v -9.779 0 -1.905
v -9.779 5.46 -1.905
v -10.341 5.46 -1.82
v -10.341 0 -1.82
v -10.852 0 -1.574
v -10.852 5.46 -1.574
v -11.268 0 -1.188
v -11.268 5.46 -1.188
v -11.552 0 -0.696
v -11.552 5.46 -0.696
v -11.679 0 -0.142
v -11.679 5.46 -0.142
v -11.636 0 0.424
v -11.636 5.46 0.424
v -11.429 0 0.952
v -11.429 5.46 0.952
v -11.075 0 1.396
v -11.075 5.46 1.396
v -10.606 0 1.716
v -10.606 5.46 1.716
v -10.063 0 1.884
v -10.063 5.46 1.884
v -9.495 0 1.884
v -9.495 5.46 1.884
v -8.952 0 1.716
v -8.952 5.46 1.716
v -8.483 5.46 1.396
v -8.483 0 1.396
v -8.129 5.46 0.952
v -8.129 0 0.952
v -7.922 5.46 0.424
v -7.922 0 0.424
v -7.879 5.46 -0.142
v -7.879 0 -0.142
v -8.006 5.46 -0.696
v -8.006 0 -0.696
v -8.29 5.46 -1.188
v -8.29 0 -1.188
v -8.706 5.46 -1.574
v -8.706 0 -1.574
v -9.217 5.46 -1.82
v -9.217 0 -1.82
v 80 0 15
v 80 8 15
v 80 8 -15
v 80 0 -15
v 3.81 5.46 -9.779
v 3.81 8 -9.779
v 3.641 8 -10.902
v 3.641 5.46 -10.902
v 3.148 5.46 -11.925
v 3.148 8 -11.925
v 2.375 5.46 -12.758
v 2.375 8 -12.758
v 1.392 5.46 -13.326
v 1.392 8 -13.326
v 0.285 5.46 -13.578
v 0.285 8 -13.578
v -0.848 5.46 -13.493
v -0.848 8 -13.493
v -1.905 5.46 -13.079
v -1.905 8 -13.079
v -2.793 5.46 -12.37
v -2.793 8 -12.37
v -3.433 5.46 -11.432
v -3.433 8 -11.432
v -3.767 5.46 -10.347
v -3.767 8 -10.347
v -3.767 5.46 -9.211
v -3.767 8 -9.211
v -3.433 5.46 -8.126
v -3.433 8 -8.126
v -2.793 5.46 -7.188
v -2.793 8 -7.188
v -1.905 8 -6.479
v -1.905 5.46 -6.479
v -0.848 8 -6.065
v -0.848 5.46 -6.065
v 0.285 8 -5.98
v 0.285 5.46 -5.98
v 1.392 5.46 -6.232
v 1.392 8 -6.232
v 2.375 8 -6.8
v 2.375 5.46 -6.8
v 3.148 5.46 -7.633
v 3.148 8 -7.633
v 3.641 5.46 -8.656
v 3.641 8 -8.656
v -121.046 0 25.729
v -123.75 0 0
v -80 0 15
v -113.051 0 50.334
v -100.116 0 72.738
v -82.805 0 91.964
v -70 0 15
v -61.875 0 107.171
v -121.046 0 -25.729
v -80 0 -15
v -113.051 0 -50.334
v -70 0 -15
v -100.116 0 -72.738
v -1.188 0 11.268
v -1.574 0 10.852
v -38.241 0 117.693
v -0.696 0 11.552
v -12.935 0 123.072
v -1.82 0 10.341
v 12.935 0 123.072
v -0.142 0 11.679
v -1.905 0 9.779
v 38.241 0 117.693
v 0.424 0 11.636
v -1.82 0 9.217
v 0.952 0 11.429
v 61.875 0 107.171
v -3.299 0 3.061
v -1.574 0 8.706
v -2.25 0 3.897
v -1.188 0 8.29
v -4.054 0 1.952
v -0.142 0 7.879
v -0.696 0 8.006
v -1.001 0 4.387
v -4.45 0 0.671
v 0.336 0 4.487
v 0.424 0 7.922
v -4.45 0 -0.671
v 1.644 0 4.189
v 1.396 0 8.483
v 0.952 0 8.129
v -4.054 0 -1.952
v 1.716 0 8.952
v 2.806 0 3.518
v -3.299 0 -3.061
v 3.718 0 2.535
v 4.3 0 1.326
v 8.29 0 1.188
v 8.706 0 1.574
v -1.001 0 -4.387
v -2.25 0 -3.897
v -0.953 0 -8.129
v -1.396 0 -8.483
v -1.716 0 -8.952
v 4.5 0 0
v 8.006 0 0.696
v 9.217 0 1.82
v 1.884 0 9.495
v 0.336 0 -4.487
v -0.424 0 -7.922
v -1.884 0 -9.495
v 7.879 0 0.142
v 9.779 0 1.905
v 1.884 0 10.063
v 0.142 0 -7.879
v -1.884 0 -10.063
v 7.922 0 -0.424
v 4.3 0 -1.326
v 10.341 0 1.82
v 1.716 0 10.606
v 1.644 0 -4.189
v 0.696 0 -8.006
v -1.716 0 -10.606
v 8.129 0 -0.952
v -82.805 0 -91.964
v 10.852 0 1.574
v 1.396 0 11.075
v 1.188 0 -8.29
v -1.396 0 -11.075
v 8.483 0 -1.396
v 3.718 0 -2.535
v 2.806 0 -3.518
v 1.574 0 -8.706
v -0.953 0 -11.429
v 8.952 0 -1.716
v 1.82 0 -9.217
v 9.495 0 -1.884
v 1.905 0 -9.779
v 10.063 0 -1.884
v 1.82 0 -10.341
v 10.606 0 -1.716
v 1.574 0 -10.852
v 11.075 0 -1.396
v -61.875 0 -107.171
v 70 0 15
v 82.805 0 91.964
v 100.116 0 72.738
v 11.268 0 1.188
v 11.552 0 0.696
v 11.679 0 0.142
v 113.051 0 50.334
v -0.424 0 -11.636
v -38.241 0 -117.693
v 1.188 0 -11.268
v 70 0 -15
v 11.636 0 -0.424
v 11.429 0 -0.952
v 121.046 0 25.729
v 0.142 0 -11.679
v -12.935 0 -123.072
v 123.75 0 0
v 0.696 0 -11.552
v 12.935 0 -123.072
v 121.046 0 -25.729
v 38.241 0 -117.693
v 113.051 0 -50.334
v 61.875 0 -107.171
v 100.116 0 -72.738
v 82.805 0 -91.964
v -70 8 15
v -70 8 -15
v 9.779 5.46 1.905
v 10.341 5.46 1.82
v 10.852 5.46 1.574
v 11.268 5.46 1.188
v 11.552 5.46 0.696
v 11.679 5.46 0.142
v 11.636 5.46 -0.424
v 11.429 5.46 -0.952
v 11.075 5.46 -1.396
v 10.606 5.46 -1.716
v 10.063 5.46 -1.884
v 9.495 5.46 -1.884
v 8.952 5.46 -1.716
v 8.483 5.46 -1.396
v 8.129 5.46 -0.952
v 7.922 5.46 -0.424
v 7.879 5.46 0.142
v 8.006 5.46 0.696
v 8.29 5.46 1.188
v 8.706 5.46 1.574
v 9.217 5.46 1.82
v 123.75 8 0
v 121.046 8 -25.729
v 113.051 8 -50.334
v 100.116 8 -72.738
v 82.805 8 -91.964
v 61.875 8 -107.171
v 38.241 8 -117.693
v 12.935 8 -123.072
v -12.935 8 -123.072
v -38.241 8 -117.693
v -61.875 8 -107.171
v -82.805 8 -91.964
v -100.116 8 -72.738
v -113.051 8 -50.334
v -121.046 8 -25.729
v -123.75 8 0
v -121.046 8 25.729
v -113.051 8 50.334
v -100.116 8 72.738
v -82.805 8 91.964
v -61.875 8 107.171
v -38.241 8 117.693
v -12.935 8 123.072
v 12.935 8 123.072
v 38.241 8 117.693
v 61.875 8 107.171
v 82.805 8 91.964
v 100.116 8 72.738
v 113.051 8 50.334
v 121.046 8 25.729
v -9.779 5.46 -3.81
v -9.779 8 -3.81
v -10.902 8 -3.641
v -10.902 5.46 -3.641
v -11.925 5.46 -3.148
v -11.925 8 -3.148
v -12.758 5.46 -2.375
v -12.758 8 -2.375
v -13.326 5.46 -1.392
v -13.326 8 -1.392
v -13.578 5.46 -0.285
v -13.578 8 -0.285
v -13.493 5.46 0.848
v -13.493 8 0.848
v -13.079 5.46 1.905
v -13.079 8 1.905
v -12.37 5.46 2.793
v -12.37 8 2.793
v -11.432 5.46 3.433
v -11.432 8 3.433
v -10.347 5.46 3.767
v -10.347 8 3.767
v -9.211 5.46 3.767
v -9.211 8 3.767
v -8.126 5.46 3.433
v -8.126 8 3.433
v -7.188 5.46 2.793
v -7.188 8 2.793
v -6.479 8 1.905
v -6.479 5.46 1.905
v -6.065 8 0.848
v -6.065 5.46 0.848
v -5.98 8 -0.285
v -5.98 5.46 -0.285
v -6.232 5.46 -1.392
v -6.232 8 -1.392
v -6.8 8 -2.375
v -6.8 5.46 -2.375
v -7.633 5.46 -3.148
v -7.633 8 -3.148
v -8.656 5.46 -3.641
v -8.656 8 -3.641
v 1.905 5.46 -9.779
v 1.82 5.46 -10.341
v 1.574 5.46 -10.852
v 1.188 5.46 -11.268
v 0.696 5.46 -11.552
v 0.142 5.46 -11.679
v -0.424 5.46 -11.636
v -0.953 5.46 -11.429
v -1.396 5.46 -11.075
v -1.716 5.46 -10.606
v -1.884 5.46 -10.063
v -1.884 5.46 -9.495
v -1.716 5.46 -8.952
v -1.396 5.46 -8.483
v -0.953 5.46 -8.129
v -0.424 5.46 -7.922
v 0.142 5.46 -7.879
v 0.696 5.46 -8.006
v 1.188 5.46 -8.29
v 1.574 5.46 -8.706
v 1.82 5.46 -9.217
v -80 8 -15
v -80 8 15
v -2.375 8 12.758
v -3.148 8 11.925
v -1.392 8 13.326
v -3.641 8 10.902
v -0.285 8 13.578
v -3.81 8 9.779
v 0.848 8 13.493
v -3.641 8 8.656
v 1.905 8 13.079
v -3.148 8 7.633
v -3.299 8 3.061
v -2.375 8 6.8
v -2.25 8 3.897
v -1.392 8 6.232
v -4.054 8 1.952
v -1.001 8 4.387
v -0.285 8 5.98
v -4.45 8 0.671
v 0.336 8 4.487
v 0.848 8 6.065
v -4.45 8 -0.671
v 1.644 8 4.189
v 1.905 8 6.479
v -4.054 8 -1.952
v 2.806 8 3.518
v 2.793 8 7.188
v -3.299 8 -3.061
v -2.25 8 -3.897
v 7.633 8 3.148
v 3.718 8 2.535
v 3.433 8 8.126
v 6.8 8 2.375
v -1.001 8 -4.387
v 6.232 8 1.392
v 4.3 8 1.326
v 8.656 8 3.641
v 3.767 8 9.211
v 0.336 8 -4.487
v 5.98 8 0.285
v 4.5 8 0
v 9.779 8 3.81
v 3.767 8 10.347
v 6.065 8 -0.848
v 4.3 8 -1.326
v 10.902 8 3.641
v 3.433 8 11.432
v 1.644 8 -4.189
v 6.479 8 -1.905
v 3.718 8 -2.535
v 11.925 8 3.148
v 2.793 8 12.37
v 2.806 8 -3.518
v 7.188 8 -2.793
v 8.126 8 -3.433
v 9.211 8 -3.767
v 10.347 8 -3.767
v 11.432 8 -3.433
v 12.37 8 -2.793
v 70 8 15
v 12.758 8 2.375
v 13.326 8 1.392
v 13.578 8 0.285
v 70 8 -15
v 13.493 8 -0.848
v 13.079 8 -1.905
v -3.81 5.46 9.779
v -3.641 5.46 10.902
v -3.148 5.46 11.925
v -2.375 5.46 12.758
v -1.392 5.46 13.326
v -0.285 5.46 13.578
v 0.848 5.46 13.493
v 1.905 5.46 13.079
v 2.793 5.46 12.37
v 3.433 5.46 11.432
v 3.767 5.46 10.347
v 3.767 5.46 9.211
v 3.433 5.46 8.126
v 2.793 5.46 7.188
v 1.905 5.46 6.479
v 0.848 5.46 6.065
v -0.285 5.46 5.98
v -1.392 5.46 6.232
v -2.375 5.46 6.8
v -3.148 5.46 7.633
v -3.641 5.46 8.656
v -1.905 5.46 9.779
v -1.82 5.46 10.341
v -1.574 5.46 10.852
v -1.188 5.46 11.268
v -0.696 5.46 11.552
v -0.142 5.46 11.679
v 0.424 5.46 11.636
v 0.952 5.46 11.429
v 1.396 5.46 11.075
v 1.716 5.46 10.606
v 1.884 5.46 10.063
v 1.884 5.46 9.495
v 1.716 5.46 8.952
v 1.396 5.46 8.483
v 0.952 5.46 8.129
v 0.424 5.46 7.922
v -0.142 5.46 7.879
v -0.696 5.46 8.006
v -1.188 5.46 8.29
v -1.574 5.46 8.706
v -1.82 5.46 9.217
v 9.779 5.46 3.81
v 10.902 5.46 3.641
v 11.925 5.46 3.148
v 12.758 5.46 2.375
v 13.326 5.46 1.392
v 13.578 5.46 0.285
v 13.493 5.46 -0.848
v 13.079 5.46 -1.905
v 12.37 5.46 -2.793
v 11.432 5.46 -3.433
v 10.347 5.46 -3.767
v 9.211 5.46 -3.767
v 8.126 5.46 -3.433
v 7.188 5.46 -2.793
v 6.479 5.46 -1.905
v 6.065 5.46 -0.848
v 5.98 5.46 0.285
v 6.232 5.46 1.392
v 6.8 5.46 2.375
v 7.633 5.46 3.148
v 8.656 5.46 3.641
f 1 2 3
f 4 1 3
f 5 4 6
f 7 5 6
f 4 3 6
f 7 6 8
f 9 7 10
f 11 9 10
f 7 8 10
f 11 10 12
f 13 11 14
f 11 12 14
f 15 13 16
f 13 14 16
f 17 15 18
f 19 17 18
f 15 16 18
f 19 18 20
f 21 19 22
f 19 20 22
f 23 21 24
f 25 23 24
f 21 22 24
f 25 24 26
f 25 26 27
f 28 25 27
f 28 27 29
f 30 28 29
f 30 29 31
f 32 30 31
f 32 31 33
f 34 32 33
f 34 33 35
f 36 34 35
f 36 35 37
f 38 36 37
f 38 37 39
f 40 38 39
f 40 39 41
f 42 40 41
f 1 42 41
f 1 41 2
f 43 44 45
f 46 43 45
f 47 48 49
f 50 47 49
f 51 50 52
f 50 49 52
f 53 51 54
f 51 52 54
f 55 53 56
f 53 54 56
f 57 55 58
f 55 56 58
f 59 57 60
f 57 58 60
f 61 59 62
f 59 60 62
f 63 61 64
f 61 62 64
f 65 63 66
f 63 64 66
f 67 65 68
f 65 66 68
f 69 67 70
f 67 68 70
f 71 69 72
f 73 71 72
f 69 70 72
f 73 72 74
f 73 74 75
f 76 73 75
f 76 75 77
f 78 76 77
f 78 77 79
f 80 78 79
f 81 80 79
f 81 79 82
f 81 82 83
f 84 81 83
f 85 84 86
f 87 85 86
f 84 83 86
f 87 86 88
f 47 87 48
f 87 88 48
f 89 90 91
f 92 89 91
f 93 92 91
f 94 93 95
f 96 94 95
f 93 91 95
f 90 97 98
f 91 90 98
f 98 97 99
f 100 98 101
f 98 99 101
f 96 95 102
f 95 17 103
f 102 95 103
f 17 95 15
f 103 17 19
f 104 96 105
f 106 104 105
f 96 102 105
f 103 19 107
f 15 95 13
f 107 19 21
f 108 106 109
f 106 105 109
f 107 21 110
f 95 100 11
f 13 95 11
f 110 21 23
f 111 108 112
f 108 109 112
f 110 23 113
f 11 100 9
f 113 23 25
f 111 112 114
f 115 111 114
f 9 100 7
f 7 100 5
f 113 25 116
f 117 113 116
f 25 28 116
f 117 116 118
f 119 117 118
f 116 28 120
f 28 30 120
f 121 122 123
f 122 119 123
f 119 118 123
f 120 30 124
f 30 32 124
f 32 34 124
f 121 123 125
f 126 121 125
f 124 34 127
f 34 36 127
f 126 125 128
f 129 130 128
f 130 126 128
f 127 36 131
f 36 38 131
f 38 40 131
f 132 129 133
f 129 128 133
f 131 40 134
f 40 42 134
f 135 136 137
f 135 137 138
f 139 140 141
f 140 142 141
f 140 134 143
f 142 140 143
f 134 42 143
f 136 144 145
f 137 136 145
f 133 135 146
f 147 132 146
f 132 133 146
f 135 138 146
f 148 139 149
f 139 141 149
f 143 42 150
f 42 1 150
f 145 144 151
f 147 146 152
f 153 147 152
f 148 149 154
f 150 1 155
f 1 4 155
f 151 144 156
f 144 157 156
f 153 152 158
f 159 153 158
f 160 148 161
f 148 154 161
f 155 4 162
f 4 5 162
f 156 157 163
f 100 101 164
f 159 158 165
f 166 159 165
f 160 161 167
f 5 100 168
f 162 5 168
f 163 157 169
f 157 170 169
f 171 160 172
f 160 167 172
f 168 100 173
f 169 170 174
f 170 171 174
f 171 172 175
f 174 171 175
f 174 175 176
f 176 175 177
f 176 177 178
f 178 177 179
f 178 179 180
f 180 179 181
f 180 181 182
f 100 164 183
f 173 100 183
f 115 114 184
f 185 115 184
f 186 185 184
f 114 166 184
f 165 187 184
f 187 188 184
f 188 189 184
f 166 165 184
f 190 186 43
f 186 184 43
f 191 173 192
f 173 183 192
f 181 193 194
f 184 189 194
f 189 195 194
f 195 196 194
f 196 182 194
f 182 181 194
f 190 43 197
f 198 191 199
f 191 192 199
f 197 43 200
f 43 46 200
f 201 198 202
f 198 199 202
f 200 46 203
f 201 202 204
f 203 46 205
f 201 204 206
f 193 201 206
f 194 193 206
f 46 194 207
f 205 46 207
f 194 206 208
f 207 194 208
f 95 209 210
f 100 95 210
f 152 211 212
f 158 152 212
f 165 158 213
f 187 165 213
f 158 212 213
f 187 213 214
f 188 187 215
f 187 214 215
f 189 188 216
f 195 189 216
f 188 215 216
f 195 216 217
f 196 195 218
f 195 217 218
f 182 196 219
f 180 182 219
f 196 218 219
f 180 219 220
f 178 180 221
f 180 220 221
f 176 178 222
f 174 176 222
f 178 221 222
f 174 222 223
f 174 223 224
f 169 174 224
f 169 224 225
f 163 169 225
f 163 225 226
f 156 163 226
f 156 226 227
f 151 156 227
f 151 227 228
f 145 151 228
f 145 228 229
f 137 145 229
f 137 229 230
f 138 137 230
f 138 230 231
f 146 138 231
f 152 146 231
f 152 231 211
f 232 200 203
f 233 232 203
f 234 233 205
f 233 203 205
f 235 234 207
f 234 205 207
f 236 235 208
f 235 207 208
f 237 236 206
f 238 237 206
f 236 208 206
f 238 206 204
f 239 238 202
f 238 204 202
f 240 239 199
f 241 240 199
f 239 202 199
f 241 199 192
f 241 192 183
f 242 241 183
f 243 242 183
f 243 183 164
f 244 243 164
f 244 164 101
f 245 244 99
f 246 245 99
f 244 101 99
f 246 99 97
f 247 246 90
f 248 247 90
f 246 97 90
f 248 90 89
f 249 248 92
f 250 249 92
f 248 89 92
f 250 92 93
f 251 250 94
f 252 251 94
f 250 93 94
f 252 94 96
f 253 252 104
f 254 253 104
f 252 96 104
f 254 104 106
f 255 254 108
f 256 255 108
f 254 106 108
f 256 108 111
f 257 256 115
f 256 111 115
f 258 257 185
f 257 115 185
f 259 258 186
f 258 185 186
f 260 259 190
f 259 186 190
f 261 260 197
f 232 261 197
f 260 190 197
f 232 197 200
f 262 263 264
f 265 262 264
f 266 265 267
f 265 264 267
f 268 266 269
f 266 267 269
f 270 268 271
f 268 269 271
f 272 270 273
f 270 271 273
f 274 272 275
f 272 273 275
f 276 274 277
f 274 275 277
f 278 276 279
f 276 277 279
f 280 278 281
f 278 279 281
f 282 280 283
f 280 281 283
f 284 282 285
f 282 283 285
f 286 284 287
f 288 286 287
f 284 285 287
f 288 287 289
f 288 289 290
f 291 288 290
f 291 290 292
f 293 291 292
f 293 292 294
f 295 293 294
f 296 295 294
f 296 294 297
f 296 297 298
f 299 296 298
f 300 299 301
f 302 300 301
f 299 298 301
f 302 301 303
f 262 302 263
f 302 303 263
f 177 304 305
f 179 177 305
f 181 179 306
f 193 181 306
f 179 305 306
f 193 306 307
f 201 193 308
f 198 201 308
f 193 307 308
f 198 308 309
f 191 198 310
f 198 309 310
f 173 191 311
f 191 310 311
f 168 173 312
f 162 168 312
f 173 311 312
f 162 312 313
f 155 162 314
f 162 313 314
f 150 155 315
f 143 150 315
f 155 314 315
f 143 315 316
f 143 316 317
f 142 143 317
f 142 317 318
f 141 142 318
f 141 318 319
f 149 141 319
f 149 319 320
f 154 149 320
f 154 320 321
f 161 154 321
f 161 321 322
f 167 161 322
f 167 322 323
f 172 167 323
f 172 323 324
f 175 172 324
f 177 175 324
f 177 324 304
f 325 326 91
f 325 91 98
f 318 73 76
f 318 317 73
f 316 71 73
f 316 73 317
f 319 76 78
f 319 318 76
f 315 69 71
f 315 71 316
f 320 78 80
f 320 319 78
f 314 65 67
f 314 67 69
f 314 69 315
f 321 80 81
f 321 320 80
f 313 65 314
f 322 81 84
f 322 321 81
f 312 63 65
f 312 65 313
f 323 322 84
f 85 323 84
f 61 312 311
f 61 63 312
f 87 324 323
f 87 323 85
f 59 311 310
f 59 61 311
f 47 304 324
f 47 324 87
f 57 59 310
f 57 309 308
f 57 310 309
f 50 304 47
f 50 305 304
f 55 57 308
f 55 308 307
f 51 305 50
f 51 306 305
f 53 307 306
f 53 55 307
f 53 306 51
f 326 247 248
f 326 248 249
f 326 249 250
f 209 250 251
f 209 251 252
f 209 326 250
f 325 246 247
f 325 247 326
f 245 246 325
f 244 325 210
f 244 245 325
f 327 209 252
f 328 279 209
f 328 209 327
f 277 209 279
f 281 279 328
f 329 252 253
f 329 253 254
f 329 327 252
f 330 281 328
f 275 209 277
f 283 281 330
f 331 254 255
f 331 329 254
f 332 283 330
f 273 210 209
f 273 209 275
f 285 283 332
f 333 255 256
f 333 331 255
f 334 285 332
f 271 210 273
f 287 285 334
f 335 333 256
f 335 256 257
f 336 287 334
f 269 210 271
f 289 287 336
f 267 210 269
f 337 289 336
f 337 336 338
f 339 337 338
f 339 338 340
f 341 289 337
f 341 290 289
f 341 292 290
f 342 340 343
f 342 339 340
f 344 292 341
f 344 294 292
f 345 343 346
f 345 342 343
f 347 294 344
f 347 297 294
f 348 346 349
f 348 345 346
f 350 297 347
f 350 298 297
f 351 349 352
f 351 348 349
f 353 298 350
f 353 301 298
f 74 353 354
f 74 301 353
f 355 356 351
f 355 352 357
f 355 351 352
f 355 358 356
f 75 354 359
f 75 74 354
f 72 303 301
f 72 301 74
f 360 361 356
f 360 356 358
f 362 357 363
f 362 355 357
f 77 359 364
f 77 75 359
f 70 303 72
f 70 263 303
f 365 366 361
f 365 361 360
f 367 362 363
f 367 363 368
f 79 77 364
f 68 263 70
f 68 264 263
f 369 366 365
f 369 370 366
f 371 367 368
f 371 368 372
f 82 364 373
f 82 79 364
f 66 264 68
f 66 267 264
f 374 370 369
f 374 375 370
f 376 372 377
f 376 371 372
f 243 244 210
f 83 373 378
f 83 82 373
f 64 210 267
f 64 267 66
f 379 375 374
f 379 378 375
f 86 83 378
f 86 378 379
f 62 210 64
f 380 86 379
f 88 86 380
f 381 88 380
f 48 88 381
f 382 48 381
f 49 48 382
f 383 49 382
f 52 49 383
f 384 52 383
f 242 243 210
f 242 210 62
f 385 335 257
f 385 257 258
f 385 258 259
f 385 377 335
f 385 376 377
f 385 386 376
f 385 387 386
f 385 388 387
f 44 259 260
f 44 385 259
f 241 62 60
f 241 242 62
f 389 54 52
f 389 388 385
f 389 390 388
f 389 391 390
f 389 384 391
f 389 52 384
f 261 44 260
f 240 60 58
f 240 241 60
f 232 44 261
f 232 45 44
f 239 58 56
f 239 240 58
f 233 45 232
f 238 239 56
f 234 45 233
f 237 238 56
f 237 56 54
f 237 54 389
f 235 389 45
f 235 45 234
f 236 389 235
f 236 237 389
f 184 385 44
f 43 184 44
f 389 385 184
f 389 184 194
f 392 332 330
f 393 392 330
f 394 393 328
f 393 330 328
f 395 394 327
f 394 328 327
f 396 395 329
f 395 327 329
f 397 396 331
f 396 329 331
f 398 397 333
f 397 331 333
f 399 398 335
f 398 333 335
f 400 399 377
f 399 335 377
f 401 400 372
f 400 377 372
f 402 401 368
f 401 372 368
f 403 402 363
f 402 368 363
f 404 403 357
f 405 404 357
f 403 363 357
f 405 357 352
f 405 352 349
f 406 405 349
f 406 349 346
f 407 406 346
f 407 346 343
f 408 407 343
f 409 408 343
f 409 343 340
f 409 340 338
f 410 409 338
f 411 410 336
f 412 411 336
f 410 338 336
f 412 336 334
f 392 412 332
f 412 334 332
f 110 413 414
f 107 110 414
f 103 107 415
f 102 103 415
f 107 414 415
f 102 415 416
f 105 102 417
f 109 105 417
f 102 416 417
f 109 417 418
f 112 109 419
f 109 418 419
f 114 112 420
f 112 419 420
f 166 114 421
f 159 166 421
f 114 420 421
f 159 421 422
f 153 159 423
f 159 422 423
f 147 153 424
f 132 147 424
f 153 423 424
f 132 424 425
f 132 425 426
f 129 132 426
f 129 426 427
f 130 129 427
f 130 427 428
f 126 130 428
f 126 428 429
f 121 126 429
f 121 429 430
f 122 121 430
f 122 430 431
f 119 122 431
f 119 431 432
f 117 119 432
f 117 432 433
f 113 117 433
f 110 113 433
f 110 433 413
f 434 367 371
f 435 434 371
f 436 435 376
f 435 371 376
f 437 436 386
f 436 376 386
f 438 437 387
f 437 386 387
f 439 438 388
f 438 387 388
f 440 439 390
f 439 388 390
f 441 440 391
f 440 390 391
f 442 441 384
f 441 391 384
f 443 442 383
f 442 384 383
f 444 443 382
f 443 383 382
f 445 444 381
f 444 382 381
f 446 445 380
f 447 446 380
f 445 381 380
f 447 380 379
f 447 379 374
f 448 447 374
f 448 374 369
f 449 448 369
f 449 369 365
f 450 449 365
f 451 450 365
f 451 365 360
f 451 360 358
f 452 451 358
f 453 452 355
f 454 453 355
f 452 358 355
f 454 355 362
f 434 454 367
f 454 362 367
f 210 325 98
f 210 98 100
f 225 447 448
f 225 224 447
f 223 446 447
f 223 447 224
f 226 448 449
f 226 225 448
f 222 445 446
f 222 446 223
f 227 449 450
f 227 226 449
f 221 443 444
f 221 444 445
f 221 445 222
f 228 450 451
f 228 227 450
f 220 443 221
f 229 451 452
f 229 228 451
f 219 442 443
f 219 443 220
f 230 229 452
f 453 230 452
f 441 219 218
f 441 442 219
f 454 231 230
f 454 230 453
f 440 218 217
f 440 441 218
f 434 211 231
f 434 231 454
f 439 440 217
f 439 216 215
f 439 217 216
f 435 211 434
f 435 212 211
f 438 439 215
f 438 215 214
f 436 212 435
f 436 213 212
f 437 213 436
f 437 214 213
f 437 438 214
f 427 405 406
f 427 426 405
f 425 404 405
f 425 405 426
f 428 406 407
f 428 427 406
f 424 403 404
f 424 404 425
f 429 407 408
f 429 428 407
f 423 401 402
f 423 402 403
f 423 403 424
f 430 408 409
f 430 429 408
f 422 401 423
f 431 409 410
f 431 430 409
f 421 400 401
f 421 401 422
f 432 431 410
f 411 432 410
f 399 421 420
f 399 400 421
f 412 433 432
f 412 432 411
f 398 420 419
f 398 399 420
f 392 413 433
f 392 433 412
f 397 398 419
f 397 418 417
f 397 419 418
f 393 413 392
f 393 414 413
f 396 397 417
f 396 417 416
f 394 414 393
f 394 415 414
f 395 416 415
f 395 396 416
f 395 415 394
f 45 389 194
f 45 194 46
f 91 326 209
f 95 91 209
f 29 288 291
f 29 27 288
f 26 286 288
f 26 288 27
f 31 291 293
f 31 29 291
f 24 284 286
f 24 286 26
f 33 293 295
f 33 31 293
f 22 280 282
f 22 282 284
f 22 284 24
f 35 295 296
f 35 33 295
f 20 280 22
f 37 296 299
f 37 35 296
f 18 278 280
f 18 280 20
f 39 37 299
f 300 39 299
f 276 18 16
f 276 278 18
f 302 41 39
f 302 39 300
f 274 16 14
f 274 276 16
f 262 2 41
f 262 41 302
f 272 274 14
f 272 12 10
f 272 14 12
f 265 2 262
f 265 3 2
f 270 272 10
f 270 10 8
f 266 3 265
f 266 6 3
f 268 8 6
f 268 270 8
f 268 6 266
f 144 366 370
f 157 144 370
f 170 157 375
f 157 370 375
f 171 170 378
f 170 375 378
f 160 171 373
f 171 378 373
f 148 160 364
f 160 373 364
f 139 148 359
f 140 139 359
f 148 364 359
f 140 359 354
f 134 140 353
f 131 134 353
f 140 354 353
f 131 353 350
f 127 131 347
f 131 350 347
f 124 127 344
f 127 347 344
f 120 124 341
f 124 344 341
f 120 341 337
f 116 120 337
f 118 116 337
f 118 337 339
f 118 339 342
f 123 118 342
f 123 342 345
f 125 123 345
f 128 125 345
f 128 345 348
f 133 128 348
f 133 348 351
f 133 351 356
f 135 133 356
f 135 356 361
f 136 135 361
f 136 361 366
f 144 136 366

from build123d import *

# Parameters (mm, degrees)
SKETCH1_R           = 123.75
BOSS_EXTRUDE1_DEPTH = 8
SKETCH2_R           = 1.905
CUT_EXTRUDE2_DEPTH  = 9
CIRPATTERN1_COUNT   = 4
SKETCH3_R           = 4.5
CUT_EXTRUDE3_DEPTH  = 9
SKETCH4_R           = 3.81
CUT_EXTRUDE4_DEPTH  = 2.54
CIRPATTERN2_COUNT   = 4
SKETCH5_W           = 10
SKETCH5_H           = 30
CUT_EXTRUDE5_DEPTH  = 9


with BuildPart() as part:
    # Sketch1 → Boss-Extrude1 (new body)
    with BuildSketch(Plane(origin=(0, 0, 0), x_dir=(1, 0, 0), z_dir=(0, 1, 0))):
        Circle(SKETCH1_R)
    extrude(amount=BOSS_EXTRUDE1_DEPTH)

    # Sketch2 → Cut-Extrude2 (cut, through all)
    with BuildSketch(Plane(origin=(0, 8, 0), x_dir=(1, 0, 0), z_dir=(0, 1, 0))):
        with Locations((0, 9.779)):
            Circle(SKETCH2_R)
    cut_extrude2 = extrude(amount=-CUT_EXTRUDE2_DEPTH, mode=Mode.SUBTRACT)

    # CirPattern1: Cut-Extrude2 ×4 about axis
    cirpattern1_axis = Axis((0, 0, 0), (0, 1, 0))
    for i in range(1, CIRPATTERN1_COUNT):
        add(cut_extrude2.rotate(cirpattern1_axis, i * 360 / CIRPATTERN1_COUNT), mode=Mode.SUBTRACT)

    # Sketch3 → Cut-Extrude3 (cut, through all)
    with BuildSketch(Plane(origin=(0, 8, 0), x_dir=(1, 0, 0), z_dir=(0, 1, 0))):
        Circle(SKETCH3_R)
    extrude(amount=-CUT_EXTRUDE3_DEPTH, mode=Mode.SUBTRACT)

    # Sketch4 → Cut-Extrude4 (cut)
    with BuildSketch(Plane(origin=(0, 8, 0), x_dir=(1, 0, 0), z_dir=(0, 1, 0))):
        with Locations((0, 9.779)):
            Circle(SKETCH4_R)
    cut_extrude4 = extrude(amount=-CUT_EXTRUDE4_DEPTH, mode=Mode.SUBTRACT)

    # CirPattern2: Cut-Extrude4 ×4 about axis
    cirpattern2_axis = Axis((0, 0, 0), (0, 1, 0))
    for i in range(1, CIRPATTERN2_COUNT):
        add(cut_extrude4.rotate(cirpattern2_axis, i * 360 / CIRPATTERN2_COUNT), mode=Mode.SUBTRACT)

    # Sketch5 → Cut-Extrude5 (cut, through all)
    with BuildSketch(Plane(origin=(0, 8, 0), x_dir=(1, 0, 0), z_dir=(0, 1, 0))):
        with Locations((75, 0)):
            Rectangle(SKETCH5_W, SKETCH5_H)
        with Locations((-75, 0)):
            Rectangle(SKETCH5_W, SKETCH5_H)
    extrude(amount=-CUT_EXTRUDE5_DEPTH, mode=Mode.SUBTRACT)


solid = part.part
